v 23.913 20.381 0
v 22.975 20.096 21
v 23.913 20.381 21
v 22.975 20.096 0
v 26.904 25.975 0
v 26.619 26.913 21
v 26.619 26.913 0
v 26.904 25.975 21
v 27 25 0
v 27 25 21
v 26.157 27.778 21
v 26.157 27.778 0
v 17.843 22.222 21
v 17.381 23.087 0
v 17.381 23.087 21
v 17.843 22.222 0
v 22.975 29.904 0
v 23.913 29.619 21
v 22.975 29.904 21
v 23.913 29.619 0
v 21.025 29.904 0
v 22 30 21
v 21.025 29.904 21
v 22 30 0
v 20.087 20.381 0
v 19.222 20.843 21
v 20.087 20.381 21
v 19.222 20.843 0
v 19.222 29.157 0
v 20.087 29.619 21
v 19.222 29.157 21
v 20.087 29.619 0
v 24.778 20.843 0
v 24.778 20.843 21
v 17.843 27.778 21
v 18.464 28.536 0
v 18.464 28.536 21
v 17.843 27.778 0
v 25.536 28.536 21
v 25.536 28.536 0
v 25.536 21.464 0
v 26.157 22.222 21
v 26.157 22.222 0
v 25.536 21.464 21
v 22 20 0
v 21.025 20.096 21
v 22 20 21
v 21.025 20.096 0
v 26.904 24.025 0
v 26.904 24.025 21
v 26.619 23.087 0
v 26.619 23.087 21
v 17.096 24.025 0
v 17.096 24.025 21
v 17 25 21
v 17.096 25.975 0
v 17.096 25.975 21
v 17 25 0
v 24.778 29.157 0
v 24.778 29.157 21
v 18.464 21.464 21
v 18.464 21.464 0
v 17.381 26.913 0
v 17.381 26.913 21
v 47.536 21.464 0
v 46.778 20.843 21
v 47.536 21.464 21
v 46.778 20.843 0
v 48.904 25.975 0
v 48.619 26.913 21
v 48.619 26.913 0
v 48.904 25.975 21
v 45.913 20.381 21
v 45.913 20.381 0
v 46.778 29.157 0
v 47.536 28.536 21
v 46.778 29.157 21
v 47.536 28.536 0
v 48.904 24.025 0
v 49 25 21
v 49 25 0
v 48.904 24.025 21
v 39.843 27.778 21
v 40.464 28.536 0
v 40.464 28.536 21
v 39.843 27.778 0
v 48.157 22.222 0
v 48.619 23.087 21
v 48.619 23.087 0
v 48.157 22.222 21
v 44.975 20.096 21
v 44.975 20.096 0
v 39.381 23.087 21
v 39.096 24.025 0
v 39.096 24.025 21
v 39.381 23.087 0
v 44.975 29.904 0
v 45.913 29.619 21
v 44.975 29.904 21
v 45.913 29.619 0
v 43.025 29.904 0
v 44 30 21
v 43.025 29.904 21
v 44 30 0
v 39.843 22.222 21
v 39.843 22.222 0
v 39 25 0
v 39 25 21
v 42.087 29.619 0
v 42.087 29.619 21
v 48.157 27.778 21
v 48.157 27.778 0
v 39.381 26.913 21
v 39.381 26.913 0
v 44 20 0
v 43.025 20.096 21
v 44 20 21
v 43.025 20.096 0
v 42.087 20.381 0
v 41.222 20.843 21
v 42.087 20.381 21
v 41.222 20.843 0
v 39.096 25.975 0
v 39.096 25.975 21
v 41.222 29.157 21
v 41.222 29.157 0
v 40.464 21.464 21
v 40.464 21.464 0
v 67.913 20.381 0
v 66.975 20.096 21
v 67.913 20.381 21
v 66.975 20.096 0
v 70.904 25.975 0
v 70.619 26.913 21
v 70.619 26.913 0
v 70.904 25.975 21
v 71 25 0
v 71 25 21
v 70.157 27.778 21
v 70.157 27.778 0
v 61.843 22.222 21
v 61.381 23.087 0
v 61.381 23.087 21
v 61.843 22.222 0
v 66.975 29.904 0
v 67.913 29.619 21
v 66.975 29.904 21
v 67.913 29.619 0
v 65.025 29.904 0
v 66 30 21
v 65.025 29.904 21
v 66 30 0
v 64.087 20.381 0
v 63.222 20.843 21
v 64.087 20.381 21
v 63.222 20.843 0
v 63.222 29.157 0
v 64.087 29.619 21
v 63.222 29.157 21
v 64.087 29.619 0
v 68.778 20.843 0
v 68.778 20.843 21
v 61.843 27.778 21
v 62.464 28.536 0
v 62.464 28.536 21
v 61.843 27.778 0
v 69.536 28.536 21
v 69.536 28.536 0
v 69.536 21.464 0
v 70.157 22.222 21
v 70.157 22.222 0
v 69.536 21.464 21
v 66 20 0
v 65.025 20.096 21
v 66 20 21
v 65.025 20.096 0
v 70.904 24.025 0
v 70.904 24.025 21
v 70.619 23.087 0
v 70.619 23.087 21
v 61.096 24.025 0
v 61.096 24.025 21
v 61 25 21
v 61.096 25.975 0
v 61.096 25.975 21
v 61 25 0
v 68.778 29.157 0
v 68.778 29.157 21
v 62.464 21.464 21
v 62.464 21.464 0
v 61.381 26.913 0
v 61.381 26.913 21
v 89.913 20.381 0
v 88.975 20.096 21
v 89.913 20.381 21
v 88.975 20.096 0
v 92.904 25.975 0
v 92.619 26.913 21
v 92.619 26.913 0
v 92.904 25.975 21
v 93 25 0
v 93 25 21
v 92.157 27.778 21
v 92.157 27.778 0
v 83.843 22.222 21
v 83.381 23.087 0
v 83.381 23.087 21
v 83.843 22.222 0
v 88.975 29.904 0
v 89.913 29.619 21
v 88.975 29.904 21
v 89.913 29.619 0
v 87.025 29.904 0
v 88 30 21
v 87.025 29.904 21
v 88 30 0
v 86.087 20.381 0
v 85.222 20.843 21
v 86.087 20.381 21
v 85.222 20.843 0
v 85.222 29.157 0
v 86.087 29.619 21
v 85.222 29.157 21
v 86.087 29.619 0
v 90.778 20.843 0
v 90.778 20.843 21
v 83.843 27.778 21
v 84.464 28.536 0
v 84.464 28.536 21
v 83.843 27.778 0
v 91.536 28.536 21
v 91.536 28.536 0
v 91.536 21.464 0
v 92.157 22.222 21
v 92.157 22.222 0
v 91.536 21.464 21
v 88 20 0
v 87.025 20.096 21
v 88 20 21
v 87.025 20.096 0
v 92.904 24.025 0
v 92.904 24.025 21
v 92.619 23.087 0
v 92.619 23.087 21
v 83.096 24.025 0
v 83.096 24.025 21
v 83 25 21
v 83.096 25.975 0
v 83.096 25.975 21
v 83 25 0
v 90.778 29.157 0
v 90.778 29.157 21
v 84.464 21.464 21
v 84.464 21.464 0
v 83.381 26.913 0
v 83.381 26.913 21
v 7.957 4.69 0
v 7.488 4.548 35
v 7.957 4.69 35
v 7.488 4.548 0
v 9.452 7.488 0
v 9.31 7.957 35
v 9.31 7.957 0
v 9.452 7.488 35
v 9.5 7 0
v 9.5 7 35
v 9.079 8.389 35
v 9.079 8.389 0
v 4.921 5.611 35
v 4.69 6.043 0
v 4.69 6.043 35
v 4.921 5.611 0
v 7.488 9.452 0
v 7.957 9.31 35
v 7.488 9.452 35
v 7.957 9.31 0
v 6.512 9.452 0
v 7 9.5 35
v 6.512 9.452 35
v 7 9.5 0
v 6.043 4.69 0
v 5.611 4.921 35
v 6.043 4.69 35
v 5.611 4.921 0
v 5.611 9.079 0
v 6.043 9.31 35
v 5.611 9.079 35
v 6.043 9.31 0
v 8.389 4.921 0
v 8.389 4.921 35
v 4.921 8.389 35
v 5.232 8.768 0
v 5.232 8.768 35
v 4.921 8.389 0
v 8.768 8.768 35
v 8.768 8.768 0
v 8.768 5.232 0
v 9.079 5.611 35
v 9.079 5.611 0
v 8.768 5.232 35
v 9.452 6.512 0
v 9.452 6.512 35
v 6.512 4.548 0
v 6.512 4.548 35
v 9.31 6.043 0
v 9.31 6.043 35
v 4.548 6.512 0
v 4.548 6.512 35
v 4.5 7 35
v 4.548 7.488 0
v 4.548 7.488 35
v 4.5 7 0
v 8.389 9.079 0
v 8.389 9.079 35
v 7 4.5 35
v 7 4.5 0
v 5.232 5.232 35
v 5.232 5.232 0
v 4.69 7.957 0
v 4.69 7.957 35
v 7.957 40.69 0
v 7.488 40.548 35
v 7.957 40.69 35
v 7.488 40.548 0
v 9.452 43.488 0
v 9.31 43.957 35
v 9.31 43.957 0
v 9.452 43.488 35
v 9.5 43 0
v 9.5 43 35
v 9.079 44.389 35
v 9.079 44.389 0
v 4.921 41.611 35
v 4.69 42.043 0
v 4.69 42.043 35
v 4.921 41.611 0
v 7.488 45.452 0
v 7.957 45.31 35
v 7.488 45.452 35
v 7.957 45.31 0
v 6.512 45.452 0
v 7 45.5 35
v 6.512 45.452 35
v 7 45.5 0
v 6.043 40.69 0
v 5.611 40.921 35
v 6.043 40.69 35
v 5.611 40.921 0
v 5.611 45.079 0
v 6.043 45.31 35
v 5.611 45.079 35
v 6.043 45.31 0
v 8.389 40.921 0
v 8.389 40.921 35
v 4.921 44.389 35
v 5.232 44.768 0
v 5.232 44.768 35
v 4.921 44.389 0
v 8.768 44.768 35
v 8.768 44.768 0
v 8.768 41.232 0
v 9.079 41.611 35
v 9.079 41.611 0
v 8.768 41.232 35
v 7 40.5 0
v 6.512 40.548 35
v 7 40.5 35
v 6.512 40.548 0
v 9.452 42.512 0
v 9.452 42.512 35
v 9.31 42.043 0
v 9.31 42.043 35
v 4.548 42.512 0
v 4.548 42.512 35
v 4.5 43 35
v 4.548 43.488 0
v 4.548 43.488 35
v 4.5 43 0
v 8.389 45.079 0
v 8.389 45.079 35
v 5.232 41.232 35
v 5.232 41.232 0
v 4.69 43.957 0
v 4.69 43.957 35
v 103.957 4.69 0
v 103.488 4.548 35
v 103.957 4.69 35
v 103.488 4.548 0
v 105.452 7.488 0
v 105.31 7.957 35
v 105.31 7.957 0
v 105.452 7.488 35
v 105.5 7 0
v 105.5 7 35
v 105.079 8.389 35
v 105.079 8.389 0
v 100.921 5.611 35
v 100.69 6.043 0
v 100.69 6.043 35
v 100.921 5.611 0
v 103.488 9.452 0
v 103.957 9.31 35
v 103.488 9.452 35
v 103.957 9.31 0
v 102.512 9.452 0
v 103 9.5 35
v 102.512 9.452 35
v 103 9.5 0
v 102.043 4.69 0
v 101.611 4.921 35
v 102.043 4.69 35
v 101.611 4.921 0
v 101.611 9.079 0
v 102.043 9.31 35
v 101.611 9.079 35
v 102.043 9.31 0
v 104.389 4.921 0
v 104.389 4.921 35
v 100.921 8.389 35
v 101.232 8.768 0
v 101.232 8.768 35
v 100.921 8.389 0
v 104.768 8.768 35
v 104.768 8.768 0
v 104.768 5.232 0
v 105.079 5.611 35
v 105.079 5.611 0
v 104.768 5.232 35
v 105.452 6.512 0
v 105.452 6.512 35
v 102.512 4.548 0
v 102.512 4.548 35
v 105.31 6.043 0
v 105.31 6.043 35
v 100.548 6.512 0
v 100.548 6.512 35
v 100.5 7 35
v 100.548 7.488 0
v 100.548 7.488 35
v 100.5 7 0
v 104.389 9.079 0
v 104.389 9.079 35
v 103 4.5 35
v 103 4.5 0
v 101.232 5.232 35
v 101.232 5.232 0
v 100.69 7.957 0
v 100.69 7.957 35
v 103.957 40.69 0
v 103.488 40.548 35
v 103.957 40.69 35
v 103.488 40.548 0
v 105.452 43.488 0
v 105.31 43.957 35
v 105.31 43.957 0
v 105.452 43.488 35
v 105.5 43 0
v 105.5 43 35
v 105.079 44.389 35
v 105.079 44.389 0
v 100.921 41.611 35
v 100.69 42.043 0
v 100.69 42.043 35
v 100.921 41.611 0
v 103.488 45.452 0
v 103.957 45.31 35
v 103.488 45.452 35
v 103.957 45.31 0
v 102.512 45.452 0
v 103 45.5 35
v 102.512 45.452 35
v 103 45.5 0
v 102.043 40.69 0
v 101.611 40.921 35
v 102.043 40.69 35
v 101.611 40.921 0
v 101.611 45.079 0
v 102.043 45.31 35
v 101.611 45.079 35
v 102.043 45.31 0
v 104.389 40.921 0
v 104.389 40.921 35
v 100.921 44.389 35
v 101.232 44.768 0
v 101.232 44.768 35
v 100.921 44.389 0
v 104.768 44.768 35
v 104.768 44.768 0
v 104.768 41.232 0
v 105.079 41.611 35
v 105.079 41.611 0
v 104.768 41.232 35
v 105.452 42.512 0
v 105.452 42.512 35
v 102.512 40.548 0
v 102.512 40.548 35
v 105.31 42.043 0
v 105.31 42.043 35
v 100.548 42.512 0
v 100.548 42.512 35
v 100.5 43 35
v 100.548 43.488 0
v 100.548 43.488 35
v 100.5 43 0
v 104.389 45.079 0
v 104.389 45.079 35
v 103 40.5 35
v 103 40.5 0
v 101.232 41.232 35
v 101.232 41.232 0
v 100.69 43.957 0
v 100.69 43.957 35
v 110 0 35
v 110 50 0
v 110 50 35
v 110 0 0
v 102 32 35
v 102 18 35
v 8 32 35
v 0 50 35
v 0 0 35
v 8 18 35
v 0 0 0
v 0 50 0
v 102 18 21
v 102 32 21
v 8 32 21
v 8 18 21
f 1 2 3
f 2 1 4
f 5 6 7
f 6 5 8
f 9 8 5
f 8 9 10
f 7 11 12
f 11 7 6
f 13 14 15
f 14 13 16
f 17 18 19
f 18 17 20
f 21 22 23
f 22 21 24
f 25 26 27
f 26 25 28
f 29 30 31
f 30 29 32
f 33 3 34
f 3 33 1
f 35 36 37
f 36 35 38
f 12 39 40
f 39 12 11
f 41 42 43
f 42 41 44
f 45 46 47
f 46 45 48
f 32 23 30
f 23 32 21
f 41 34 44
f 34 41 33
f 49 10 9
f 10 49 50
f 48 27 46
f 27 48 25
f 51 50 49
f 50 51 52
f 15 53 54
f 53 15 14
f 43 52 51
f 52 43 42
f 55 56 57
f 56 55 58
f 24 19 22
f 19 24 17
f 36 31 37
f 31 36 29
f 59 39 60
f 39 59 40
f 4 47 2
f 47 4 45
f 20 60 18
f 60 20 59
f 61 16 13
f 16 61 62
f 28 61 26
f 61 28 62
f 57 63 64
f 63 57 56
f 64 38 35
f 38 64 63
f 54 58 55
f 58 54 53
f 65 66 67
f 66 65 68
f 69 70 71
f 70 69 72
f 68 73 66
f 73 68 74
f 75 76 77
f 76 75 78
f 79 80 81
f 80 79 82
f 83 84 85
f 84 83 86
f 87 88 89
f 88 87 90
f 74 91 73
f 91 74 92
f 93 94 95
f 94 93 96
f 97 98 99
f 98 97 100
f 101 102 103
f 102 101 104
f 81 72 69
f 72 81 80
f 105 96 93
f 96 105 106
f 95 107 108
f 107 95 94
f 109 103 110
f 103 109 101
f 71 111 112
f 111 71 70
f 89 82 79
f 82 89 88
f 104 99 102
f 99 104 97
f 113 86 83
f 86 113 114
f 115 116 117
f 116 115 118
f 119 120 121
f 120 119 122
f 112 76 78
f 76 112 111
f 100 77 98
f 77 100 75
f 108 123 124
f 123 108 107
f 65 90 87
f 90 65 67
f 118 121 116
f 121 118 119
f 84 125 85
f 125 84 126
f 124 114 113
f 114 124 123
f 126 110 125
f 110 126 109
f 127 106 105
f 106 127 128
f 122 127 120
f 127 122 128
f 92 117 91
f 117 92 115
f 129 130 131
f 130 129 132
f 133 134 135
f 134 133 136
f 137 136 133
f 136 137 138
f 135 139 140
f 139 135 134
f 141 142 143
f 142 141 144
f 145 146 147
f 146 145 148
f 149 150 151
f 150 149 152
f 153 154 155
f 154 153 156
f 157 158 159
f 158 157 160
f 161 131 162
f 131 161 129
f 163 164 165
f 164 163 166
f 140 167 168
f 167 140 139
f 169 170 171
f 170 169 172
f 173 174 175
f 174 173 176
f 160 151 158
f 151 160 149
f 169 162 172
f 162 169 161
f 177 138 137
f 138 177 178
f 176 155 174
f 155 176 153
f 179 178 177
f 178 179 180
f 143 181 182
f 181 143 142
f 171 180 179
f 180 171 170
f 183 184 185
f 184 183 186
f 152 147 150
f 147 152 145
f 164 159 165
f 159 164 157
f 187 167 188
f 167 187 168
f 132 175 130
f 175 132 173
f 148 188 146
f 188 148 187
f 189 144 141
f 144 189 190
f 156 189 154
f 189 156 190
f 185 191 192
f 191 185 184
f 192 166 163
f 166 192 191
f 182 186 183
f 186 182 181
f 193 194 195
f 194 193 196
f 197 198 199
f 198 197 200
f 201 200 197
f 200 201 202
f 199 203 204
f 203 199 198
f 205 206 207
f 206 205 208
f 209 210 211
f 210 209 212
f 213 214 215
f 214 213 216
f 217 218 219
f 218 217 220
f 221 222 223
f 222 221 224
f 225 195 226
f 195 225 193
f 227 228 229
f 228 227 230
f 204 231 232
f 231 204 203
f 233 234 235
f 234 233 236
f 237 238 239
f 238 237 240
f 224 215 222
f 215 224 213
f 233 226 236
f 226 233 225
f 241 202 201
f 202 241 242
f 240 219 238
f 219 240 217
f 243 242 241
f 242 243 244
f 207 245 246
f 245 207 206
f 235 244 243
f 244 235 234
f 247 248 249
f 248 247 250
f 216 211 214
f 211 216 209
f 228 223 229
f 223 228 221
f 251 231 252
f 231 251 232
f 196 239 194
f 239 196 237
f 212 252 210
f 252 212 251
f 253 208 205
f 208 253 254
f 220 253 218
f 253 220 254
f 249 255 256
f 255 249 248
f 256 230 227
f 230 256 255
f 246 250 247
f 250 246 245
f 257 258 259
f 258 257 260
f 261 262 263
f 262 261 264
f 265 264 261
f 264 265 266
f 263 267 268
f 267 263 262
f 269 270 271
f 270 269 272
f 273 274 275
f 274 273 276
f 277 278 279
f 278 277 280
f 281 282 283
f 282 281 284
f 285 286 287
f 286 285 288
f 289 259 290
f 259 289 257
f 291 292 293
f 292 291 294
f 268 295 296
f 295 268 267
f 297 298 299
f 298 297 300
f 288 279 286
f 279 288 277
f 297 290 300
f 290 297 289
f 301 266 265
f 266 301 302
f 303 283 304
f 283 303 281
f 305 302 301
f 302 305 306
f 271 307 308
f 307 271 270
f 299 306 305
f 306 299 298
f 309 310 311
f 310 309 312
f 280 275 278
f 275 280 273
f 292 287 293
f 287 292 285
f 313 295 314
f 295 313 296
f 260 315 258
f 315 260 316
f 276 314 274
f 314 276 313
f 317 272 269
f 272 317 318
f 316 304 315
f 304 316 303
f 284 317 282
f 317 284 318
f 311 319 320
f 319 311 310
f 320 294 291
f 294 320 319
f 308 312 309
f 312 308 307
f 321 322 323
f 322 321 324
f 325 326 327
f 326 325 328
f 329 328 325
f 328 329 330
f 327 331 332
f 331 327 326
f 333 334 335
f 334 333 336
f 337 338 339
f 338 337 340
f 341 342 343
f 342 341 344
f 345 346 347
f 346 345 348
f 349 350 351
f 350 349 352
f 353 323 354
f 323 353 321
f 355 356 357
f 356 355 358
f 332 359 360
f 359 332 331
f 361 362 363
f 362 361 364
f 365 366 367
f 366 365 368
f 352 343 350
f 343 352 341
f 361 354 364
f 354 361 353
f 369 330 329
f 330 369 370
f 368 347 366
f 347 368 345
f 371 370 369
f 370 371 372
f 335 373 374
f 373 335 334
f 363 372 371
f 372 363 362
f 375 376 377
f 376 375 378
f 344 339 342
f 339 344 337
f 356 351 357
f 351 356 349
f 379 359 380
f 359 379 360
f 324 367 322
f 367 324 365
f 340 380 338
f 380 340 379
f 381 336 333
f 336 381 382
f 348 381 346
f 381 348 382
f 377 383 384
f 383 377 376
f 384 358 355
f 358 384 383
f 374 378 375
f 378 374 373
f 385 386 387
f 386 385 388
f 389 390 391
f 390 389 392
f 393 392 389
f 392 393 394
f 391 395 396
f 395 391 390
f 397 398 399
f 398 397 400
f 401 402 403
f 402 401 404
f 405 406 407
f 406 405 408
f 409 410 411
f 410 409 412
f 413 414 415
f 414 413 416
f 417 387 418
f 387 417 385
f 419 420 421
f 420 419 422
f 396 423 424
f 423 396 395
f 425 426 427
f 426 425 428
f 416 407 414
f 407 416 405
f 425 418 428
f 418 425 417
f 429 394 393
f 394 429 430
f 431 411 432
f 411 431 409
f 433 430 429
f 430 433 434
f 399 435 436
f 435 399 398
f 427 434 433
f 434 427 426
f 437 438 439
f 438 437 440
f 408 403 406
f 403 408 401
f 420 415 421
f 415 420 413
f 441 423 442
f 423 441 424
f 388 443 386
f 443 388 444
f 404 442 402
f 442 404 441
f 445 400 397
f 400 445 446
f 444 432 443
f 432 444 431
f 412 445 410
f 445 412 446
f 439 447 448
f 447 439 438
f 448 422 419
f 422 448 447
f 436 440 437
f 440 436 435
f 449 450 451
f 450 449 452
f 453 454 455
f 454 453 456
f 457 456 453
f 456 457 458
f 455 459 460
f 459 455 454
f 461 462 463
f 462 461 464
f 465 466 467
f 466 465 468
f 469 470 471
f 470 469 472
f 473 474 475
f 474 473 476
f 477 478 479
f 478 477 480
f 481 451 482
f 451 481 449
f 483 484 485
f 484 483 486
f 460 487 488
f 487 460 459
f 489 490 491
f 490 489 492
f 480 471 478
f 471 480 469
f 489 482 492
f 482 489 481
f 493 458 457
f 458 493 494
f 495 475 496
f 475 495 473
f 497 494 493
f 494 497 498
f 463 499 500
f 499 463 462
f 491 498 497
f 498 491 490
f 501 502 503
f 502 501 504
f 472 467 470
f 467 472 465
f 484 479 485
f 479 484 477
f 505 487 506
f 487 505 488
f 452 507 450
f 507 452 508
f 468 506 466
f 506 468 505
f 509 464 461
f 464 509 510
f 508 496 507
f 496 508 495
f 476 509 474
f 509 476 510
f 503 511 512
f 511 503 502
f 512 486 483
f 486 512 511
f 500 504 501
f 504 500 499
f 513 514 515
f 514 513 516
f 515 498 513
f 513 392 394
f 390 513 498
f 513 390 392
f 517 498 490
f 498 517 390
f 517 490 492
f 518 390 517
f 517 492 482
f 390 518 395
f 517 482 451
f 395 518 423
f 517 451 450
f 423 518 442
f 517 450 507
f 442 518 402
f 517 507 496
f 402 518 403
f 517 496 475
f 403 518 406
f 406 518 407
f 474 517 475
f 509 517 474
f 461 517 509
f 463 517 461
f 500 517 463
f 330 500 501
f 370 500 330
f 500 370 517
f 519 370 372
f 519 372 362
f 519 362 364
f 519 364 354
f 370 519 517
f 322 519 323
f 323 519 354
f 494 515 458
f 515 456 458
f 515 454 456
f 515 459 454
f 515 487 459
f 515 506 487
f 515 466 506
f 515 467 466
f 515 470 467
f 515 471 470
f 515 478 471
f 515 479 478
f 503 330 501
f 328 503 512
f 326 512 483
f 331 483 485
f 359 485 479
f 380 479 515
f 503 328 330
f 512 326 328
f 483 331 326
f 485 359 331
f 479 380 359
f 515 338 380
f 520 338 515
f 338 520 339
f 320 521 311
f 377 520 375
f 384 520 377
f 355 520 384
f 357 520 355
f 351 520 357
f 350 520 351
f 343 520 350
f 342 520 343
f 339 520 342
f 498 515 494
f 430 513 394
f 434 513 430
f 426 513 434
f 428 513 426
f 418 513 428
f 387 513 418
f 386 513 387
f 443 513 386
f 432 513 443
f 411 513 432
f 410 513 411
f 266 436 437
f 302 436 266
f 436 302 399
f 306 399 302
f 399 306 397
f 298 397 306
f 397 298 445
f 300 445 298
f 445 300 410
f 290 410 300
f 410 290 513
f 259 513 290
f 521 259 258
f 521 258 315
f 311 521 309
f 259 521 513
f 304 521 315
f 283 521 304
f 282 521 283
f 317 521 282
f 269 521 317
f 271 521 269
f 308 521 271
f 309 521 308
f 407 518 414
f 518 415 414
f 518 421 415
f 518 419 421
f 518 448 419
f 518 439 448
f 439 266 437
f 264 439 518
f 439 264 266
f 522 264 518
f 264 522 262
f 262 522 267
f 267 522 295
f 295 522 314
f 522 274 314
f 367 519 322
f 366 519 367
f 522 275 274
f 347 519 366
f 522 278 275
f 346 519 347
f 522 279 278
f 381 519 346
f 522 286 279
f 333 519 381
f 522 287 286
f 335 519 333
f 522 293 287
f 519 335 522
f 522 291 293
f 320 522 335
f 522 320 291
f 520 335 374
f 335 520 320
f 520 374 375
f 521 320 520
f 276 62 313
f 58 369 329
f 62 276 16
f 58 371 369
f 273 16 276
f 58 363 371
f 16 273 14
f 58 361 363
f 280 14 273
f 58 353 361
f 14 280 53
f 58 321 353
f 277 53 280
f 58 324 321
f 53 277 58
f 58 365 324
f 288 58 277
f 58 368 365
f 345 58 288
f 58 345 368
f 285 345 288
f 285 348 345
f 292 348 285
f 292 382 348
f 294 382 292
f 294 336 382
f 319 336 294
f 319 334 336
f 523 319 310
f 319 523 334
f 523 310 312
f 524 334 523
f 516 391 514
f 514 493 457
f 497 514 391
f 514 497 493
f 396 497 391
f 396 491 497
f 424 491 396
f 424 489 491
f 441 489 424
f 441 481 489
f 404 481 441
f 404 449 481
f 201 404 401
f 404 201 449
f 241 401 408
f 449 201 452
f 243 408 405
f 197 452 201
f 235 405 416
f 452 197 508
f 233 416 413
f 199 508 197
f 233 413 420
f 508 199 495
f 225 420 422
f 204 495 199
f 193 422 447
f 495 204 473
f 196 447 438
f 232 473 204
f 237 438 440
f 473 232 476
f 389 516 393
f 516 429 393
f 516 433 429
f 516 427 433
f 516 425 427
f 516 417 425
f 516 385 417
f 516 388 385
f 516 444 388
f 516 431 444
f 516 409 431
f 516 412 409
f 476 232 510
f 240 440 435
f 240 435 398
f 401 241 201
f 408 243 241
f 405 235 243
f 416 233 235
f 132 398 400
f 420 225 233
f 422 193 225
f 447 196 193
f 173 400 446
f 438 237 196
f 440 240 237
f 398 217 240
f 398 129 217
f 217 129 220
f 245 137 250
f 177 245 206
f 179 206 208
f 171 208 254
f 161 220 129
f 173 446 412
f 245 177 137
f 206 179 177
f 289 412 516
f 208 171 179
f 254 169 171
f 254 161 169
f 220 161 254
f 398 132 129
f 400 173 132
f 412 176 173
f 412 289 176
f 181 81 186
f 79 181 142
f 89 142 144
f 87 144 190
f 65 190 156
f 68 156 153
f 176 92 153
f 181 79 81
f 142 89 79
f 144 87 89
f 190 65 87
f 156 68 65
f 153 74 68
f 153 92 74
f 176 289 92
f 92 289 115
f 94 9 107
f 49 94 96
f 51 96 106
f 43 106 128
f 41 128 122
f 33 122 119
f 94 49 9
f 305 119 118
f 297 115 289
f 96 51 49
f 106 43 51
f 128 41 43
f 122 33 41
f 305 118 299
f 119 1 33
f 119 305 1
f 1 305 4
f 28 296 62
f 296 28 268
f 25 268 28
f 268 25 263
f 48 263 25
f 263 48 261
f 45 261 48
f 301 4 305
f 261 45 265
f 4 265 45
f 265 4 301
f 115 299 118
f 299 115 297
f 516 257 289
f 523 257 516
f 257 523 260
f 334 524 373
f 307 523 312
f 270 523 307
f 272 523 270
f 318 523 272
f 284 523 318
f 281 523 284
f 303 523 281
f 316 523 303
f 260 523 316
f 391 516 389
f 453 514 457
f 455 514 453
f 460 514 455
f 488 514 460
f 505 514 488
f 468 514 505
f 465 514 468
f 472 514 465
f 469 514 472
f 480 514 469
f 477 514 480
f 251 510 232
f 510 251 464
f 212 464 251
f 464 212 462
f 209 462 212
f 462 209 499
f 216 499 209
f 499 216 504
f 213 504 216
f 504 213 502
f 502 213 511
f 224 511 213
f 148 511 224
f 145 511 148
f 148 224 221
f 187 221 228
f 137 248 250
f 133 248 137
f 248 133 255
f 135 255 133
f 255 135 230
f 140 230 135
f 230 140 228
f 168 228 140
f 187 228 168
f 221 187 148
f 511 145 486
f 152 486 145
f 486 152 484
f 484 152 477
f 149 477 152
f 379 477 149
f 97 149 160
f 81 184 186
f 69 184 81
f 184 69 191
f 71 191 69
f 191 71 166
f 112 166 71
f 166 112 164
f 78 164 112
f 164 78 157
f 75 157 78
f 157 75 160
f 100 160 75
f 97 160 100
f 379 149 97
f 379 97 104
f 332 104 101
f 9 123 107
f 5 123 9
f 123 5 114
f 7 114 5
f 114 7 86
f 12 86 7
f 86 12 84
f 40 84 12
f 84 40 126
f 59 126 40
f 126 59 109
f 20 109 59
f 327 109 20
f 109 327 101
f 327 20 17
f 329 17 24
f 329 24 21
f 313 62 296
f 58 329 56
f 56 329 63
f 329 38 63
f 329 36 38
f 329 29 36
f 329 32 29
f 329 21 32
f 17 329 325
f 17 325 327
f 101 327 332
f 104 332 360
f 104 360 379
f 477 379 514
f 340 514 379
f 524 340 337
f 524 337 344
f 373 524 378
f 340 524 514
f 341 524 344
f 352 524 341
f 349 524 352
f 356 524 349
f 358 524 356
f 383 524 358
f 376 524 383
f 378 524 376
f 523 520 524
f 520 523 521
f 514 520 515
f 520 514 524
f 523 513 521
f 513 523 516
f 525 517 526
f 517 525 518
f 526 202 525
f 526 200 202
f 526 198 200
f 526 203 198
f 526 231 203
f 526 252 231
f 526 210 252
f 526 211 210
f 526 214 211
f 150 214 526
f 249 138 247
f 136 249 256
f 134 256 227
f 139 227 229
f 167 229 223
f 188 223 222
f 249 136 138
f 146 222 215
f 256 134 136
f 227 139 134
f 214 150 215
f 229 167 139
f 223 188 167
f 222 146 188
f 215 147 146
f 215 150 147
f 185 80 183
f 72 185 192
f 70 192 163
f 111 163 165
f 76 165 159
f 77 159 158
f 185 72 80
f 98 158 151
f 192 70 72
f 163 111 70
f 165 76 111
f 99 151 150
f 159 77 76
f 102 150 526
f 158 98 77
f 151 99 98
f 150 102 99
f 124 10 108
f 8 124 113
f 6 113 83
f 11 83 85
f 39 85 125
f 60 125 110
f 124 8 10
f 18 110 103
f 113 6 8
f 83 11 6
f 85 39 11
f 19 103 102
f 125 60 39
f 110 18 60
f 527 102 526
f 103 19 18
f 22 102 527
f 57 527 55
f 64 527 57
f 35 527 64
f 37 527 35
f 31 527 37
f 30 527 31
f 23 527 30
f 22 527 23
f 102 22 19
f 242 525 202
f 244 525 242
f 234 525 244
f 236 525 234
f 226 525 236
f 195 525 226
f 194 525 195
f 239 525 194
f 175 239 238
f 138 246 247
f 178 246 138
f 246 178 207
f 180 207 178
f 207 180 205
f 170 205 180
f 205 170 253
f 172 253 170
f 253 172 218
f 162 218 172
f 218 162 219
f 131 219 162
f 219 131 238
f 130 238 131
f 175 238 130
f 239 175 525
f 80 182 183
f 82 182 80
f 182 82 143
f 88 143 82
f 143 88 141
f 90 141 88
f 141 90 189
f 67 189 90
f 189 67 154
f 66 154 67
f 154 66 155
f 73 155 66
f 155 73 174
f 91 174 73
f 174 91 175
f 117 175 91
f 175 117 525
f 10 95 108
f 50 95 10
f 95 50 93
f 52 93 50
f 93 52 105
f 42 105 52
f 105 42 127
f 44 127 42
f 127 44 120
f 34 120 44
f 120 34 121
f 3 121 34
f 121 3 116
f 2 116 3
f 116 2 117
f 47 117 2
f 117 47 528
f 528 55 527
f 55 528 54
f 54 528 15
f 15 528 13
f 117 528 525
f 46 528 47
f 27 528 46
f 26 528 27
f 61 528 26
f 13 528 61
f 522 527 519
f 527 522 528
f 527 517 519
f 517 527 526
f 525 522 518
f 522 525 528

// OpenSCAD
$fn = 32;

// ----------------------------------------------------------------------
// Manifold block: gallery_top manifold
// ----------------------------------------------------------------------

// --- parameters (mm) ---
block_l = 110;            // block length, X
block_w = 50;             // block width, Y
block_h = 35;             // block height, Z
port_d = 10;              // port bore diameter
port_pitch = 22;          // port pitch along X
gallery_d = 14;           // top gallery width, Y
gallery_depth = 14;       // gallery pocket depth
wall_p = 8;               // gallery end wall thickness, X
mnt_d = 5;                // mounting hole diameter
mnt_in = 7;               // mounting hole inset from the edges
fit_tol = 0.05;           // tolerance for press fits, mm
free_tol = 0.3;           // tolerance for clearance fits, mm

n_ports = 4;  // ports in the row
port_x0 = (block_l - (n_ports - 1) * port_pitch) / 2;  // first port X

difference() {
  cube([block_l, block_w, block_h]);
  for (i = [0 : n_ports - 1])
    translate([port_x0 + i * port_pitch, block_w / 2, -1])
      cylinder(h = block_h + 2, d = port_d);
  translate([wall_p, block_w / 2 - gallery_d / 2, block_h - gallery_depth])
    cube([block_l - 2 * wall_p, gallery_d, gallery_depth + 1]);
  for (cx = [mnt_in, block_l - mnt_in])
    for (cy = [mnt_in, block_w - mnt_in])
      translate([cx, cy, -1]) cylinder(h = block_h + 2, d = mnt_d);
}
